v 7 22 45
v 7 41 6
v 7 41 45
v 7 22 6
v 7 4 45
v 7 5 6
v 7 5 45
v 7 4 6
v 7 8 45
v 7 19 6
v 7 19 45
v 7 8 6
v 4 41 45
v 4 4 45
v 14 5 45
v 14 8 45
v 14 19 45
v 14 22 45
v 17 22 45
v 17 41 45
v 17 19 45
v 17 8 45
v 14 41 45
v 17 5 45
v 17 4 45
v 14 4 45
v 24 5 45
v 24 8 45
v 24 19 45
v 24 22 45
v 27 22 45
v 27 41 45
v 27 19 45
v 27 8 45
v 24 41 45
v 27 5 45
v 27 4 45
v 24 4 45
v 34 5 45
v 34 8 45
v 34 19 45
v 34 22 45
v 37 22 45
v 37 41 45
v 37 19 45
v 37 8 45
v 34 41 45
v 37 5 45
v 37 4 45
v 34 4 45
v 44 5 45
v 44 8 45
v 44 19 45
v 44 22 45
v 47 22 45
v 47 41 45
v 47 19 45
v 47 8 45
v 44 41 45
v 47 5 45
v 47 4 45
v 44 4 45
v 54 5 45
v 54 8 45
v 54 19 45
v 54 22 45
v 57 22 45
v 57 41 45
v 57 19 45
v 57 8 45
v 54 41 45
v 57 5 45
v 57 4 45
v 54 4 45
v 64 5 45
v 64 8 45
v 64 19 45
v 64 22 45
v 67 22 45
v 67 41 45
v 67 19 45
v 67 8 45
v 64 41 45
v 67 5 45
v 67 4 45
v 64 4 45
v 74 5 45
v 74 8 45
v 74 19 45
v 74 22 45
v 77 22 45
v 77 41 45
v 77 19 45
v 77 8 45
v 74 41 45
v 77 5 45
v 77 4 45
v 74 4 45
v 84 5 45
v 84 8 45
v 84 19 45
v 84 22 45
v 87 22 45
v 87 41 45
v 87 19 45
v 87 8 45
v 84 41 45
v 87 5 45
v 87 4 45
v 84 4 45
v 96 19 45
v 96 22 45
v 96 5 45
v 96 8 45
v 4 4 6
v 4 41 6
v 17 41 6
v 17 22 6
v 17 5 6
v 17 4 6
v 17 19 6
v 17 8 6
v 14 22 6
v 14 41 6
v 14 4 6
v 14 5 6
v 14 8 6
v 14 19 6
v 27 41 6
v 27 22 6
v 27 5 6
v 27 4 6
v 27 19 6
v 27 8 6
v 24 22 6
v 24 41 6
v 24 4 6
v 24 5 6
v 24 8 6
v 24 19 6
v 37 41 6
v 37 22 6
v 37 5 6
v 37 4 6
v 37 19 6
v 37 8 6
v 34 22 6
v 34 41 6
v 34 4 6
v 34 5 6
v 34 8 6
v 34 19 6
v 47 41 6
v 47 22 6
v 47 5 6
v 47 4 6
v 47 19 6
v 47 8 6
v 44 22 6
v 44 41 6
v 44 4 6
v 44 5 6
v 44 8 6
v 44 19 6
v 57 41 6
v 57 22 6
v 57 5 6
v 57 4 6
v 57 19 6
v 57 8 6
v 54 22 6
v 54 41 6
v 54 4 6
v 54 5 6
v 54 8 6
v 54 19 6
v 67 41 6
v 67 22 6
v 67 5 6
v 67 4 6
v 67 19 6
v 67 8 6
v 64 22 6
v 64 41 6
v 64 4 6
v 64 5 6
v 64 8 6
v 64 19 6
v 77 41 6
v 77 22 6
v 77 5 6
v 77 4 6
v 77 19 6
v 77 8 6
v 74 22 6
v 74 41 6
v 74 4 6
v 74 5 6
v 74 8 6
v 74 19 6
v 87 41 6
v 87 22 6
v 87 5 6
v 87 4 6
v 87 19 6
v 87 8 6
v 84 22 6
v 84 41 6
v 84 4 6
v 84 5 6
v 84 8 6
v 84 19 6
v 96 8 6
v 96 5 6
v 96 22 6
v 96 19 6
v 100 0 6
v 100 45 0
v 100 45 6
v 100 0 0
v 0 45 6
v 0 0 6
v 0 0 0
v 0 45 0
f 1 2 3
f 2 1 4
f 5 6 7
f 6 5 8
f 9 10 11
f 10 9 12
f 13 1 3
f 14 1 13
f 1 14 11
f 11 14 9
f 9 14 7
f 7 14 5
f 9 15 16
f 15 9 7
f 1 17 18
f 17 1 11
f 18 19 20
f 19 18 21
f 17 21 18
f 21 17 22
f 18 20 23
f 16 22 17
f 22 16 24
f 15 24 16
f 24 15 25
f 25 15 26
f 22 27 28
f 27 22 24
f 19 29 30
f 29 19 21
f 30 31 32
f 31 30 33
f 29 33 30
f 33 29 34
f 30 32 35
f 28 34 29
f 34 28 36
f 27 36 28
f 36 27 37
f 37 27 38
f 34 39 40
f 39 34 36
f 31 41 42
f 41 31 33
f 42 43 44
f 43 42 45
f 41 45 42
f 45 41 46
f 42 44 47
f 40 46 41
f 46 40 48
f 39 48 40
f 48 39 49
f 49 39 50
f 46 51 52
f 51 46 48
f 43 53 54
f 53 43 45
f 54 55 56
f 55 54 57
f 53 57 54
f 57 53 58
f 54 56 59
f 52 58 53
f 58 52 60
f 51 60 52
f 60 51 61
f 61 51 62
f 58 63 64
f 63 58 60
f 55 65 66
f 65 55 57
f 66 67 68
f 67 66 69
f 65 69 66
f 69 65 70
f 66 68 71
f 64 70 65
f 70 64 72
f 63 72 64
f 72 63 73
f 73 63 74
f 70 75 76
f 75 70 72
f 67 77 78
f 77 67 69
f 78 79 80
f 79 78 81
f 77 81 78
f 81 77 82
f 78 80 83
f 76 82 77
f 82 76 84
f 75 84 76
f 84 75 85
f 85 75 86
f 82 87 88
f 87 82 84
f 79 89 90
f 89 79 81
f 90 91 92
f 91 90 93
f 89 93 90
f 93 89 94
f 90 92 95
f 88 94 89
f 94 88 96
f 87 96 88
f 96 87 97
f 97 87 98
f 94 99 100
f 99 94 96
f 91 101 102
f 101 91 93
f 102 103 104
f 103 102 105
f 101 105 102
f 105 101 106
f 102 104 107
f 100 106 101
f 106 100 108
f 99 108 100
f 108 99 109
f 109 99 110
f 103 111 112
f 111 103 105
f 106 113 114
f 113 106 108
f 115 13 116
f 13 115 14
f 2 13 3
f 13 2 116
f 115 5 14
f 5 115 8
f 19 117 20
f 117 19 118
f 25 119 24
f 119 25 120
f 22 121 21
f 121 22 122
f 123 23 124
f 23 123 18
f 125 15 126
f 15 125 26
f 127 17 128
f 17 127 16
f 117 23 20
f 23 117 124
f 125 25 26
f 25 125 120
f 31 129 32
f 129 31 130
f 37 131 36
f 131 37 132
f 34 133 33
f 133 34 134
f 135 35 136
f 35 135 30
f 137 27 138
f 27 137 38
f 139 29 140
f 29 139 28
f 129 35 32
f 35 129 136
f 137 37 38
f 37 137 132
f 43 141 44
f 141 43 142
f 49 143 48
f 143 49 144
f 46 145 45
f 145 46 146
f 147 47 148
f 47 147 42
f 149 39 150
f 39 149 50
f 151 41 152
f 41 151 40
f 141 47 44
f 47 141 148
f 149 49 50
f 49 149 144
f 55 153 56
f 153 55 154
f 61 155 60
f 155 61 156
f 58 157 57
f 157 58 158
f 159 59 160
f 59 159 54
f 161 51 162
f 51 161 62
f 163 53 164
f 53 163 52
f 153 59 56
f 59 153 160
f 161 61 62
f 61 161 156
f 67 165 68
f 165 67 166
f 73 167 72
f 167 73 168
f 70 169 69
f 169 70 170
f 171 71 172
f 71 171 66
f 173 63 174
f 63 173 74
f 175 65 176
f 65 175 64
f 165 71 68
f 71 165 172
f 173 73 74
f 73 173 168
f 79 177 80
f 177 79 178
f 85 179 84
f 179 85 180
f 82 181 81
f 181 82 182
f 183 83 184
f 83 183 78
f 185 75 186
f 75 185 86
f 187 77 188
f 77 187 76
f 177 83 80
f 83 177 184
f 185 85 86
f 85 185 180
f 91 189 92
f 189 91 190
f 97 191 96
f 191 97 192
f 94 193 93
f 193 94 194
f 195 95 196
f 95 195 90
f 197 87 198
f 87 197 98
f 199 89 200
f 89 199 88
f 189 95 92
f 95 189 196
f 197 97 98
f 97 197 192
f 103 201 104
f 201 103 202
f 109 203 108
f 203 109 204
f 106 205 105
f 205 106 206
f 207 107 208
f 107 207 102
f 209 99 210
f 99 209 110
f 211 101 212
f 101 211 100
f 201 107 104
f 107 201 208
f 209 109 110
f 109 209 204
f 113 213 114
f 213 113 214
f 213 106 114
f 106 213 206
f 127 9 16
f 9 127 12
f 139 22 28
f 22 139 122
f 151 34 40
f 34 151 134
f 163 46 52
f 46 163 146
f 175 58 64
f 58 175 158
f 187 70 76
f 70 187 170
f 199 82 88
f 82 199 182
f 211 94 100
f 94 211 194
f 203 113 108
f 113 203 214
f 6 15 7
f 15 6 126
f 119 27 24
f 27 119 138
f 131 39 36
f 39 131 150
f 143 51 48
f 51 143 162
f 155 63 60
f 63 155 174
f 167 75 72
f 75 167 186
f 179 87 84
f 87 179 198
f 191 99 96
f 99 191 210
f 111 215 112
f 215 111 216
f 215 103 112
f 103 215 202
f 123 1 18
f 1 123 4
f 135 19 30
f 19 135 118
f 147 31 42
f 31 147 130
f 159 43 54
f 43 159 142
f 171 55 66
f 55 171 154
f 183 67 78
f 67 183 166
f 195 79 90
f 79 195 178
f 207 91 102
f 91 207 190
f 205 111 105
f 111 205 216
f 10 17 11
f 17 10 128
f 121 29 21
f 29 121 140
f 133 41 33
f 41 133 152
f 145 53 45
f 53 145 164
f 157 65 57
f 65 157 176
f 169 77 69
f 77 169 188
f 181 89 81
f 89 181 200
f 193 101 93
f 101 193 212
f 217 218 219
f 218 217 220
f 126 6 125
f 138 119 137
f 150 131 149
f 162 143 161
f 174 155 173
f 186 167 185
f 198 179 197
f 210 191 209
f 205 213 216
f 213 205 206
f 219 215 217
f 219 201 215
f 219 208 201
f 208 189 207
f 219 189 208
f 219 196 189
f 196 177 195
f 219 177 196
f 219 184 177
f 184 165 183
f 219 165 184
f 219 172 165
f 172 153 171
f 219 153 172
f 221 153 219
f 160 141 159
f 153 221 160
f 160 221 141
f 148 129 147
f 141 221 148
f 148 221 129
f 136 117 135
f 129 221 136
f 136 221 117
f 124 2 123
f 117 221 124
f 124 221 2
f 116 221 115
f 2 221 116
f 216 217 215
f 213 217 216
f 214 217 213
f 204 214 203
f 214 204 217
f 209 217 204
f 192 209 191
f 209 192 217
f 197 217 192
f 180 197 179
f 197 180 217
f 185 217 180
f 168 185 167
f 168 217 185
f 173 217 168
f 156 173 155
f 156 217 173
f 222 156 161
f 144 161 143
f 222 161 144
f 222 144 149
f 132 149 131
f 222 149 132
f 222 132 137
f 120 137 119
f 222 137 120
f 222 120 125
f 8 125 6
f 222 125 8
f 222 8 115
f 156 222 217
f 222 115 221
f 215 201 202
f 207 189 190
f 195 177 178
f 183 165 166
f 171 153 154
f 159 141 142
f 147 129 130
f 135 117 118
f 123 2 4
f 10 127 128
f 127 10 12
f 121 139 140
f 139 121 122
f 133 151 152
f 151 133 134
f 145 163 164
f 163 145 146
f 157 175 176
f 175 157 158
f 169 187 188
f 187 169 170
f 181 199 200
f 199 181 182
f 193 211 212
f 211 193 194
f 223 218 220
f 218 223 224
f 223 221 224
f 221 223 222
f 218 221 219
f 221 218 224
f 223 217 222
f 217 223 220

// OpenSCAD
$fn = 32;

// ----------------------------------------------------------------------
// Heatsink: cross fin block
// ----------------------------------------------------------------------

// --- parameters (mm) ---
base_l = 100;             // base length, X
base_w = 45;              // base width, Y
base_t = 6;               // base plate thickness
fin_h = 40;               // fin height above the base
fin_t = 3;                // fin thickness
edge = 4;                 // margin from the base ends
pitch = 10;               // fin pitch
rib_pitch = 14;           // cross rib pitch

n_fins = floor((base_l - 2 * edge - fin_t) / pitch) + 1;  // fin count
total_h = base_t + fin_h - 1;  // overall height
n_ribs = floor((base_w - 2 * edge) / rib_pitch);  // rib count

union() {
  cube([base_l, base_w, base_t]);
  for (i = [0 : n_fins - 1])
    translate([edge + i * pitch, edge, base_t - 1])
      cube([fin_t, base_w - 2 * edge, fin_h]);
  for (i = [0 : n_ribs - 1])
    translate([edge, edge + 1 + i * rib_pitch, base_t - 1])
      cube([base_l - 2 * edge, fin_t, fin_h]);
}
